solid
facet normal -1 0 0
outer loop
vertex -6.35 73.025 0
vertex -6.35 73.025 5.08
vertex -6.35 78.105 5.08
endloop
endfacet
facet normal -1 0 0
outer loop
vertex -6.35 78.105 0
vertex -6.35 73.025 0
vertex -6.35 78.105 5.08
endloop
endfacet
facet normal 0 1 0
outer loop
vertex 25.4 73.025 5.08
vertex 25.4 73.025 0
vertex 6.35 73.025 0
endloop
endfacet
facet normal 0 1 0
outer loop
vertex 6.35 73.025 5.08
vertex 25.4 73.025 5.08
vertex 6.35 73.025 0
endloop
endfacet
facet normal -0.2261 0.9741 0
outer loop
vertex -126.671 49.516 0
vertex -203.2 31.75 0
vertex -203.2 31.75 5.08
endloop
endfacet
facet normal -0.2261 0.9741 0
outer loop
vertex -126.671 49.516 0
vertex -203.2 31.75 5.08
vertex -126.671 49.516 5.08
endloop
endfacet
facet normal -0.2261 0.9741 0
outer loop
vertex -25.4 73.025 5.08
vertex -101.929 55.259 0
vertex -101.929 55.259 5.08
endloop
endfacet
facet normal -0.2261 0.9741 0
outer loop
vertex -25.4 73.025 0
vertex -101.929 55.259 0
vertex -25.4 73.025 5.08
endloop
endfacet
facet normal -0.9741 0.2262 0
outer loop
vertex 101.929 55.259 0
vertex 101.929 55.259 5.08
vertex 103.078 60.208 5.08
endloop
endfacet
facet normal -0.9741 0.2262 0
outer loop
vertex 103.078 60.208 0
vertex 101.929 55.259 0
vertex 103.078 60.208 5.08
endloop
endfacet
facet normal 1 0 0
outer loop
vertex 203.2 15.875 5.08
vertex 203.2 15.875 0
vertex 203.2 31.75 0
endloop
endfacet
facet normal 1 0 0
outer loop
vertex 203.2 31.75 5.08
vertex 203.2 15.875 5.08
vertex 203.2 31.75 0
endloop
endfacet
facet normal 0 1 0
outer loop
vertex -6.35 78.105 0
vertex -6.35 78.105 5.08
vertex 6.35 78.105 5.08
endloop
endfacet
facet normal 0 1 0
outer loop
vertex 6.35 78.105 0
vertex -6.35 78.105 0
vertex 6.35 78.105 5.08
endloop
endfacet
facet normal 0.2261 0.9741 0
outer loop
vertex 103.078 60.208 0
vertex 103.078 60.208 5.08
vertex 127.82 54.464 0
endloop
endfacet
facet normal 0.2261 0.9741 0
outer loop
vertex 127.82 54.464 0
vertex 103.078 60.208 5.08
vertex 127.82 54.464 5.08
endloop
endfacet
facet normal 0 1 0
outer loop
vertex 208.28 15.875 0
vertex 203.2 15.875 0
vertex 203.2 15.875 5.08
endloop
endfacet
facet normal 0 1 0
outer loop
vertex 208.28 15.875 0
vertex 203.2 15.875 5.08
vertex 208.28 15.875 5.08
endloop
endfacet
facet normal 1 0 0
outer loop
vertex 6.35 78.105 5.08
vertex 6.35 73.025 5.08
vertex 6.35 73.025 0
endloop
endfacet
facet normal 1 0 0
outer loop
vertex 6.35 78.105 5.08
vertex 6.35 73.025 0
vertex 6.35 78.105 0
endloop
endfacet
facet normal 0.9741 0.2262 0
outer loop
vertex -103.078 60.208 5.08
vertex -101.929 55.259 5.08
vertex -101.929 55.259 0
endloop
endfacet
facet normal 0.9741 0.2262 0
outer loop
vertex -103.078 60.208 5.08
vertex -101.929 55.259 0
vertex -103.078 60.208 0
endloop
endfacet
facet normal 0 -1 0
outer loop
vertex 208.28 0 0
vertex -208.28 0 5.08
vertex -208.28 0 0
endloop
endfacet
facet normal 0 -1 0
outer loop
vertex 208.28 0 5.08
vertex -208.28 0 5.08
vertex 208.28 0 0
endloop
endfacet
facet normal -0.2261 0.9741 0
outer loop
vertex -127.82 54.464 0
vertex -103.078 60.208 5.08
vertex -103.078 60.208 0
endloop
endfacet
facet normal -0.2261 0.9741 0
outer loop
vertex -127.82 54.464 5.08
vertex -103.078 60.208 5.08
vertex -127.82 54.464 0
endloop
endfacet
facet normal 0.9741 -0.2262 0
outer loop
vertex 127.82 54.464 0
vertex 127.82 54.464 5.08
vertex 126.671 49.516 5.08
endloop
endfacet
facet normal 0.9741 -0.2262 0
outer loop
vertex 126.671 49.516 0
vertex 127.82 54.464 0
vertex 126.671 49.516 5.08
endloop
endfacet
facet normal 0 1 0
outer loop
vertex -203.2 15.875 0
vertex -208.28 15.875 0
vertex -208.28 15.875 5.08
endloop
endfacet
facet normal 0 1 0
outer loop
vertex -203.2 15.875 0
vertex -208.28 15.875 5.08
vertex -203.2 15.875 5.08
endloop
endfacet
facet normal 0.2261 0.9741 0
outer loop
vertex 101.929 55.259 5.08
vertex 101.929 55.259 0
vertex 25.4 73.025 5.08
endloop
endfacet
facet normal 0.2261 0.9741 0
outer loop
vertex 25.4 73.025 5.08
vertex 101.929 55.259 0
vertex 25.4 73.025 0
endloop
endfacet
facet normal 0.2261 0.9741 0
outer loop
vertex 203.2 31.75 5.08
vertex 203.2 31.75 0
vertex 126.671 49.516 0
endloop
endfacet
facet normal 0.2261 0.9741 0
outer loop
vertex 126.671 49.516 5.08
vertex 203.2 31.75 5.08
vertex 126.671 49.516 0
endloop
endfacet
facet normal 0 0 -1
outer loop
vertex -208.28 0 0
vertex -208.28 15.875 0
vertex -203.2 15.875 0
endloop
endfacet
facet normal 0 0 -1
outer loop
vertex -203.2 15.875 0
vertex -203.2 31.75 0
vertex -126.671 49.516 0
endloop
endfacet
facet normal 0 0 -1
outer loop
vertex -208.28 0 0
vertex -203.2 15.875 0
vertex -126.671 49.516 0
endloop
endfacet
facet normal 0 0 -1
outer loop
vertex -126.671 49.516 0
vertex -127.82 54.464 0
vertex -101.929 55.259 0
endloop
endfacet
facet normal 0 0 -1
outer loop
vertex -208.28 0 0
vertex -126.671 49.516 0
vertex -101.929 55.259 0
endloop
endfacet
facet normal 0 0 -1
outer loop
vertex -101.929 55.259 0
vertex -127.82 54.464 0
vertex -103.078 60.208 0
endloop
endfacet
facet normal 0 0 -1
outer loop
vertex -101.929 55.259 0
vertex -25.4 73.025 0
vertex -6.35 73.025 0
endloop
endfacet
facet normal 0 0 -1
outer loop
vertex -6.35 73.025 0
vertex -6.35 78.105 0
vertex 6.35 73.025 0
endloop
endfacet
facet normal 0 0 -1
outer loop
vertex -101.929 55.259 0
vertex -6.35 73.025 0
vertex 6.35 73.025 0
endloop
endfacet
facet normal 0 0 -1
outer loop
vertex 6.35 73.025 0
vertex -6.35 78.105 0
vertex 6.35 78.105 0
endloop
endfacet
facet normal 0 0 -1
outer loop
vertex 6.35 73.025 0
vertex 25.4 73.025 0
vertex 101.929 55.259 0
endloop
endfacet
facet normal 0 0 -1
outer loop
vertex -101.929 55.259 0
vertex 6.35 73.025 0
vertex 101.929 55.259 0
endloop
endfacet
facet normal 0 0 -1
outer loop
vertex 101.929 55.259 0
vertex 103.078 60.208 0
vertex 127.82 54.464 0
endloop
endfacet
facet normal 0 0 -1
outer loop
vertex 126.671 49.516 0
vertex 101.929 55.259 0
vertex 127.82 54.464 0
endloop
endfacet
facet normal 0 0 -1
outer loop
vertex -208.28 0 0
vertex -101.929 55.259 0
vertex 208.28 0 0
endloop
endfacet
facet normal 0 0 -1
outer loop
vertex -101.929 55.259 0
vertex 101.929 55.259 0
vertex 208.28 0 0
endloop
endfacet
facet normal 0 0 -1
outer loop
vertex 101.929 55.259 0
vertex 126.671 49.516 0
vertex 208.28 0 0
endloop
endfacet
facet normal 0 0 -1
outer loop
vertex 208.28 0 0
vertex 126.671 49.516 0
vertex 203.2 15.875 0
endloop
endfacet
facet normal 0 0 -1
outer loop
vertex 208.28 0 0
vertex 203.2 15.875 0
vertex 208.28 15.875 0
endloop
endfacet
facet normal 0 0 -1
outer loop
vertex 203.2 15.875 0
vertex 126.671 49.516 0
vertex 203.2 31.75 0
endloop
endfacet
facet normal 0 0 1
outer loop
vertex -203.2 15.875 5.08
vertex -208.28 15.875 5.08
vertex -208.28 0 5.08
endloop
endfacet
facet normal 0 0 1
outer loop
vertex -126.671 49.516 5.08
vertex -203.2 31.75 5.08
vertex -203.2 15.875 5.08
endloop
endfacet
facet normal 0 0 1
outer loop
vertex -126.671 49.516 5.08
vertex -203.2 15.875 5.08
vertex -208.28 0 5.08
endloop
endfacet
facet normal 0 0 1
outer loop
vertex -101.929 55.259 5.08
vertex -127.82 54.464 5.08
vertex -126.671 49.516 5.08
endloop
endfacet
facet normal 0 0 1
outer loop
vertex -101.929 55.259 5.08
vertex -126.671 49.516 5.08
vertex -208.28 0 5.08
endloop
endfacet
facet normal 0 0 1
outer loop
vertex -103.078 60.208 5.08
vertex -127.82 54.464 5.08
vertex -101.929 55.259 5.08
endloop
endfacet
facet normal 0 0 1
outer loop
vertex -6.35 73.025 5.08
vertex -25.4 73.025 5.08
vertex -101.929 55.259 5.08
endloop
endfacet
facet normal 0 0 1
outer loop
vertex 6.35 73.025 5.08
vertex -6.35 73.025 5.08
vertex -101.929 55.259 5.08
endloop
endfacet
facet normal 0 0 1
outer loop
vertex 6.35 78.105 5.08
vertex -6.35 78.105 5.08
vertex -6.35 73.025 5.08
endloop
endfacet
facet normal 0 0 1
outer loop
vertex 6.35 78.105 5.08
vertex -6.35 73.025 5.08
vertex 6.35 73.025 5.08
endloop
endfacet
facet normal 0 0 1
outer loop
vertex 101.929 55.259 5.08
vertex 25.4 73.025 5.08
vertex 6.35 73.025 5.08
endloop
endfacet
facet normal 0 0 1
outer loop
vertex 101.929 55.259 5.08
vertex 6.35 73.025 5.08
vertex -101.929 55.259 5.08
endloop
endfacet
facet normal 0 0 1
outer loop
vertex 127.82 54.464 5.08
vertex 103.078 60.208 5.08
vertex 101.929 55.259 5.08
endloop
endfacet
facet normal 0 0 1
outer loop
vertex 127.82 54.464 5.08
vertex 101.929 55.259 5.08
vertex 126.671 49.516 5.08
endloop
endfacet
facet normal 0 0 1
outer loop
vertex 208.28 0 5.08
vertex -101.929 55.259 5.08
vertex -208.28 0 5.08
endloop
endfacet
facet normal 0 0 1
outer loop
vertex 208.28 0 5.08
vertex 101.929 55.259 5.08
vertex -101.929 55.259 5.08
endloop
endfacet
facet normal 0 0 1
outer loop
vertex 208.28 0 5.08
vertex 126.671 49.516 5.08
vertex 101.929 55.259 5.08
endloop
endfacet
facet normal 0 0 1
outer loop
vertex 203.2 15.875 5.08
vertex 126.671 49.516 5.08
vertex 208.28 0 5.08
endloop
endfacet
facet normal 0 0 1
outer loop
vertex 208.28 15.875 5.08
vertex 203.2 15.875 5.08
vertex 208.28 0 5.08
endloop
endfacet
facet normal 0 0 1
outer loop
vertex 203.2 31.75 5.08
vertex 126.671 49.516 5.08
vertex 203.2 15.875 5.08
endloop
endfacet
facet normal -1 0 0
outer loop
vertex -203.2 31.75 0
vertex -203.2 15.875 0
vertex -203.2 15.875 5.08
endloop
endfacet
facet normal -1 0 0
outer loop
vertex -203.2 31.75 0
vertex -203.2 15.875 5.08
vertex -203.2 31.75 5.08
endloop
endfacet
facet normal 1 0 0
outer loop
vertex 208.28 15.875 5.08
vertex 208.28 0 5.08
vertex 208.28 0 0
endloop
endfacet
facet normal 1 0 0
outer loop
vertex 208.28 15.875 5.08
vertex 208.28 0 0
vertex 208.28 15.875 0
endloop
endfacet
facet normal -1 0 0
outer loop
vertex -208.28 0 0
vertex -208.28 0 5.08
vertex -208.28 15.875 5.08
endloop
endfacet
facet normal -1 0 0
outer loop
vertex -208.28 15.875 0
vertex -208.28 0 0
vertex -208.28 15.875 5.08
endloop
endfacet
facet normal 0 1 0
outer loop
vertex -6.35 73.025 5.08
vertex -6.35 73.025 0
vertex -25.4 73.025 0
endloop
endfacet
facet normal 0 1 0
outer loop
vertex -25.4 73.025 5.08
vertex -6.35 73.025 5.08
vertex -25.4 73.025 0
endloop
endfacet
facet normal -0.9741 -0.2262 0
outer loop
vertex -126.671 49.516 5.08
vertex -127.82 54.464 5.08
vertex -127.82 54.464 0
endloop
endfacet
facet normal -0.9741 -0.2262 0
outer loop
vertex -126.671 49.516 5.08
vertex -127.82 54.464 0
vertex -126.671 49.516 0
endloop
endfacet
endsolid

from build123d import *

# Parameters (mm, degrees)
BOSS_EXTRUDE1_DEPTH = 5.08
SKETCH2_W           = 5.08
SKETCH2_H           = 15.875
SKETCH2_W_2         = 12.7
SKETCH2_H_2         = 5.08
BOSS_EXTRUDE2_DEPTH = 5.08


with BuildPart() as part:
    # Sketch1 → Boss-Extrude1 (new body)
    with BuildSketch(Plane.XY):
        Polygon((-203.2, 0), (-203.2, 31.75), (-25.4, 73.025), (0, 73.025), (0, 0), align=None)
    boss_extrude1 = extrude(amount=BOSS_EXTRUDE1_DEPTH)

    # Mirror1: Boss-Extrude1 across plane
    add(boss_extrude1.mirror(Plane(origin=(0, 73.025, 5.08), x_dir=(0, 0, 1), z_dir=(-1, 0, 0))))

    # Sketch2 → Boss-Extrude2 (add)
    with BuildSketch(Plane.XY.offset(5.08)):
        Polygon((-126.671034443, 49.515652719), (-101.928965557, 55.259347281), (-103.077704469, 60.207761059), (-127.819773356, 54.464066496), align=None)
        with Locations((-205.74, 7.9375)):
            Rectangle(SKETCH2_W, SKETCH2_H)
        with Locations((0, 75.565)):
            Rectangle(SKETCH2_W_2, SKETCH2_H_2)
        with Locations((205.74, 7.9375)):
            Rectangle(SKETCH2_W, SKETCH2_H)
        Polygon((126.671034443, 49.515652719), (101.928965557, 55.259347281), (103.077704469, 60.207761059), (127.819773356, 54.464066496), align=None)
    extrude(amount=-BOSS_EXTRUDE2_DEPTH)


solid = part.part
